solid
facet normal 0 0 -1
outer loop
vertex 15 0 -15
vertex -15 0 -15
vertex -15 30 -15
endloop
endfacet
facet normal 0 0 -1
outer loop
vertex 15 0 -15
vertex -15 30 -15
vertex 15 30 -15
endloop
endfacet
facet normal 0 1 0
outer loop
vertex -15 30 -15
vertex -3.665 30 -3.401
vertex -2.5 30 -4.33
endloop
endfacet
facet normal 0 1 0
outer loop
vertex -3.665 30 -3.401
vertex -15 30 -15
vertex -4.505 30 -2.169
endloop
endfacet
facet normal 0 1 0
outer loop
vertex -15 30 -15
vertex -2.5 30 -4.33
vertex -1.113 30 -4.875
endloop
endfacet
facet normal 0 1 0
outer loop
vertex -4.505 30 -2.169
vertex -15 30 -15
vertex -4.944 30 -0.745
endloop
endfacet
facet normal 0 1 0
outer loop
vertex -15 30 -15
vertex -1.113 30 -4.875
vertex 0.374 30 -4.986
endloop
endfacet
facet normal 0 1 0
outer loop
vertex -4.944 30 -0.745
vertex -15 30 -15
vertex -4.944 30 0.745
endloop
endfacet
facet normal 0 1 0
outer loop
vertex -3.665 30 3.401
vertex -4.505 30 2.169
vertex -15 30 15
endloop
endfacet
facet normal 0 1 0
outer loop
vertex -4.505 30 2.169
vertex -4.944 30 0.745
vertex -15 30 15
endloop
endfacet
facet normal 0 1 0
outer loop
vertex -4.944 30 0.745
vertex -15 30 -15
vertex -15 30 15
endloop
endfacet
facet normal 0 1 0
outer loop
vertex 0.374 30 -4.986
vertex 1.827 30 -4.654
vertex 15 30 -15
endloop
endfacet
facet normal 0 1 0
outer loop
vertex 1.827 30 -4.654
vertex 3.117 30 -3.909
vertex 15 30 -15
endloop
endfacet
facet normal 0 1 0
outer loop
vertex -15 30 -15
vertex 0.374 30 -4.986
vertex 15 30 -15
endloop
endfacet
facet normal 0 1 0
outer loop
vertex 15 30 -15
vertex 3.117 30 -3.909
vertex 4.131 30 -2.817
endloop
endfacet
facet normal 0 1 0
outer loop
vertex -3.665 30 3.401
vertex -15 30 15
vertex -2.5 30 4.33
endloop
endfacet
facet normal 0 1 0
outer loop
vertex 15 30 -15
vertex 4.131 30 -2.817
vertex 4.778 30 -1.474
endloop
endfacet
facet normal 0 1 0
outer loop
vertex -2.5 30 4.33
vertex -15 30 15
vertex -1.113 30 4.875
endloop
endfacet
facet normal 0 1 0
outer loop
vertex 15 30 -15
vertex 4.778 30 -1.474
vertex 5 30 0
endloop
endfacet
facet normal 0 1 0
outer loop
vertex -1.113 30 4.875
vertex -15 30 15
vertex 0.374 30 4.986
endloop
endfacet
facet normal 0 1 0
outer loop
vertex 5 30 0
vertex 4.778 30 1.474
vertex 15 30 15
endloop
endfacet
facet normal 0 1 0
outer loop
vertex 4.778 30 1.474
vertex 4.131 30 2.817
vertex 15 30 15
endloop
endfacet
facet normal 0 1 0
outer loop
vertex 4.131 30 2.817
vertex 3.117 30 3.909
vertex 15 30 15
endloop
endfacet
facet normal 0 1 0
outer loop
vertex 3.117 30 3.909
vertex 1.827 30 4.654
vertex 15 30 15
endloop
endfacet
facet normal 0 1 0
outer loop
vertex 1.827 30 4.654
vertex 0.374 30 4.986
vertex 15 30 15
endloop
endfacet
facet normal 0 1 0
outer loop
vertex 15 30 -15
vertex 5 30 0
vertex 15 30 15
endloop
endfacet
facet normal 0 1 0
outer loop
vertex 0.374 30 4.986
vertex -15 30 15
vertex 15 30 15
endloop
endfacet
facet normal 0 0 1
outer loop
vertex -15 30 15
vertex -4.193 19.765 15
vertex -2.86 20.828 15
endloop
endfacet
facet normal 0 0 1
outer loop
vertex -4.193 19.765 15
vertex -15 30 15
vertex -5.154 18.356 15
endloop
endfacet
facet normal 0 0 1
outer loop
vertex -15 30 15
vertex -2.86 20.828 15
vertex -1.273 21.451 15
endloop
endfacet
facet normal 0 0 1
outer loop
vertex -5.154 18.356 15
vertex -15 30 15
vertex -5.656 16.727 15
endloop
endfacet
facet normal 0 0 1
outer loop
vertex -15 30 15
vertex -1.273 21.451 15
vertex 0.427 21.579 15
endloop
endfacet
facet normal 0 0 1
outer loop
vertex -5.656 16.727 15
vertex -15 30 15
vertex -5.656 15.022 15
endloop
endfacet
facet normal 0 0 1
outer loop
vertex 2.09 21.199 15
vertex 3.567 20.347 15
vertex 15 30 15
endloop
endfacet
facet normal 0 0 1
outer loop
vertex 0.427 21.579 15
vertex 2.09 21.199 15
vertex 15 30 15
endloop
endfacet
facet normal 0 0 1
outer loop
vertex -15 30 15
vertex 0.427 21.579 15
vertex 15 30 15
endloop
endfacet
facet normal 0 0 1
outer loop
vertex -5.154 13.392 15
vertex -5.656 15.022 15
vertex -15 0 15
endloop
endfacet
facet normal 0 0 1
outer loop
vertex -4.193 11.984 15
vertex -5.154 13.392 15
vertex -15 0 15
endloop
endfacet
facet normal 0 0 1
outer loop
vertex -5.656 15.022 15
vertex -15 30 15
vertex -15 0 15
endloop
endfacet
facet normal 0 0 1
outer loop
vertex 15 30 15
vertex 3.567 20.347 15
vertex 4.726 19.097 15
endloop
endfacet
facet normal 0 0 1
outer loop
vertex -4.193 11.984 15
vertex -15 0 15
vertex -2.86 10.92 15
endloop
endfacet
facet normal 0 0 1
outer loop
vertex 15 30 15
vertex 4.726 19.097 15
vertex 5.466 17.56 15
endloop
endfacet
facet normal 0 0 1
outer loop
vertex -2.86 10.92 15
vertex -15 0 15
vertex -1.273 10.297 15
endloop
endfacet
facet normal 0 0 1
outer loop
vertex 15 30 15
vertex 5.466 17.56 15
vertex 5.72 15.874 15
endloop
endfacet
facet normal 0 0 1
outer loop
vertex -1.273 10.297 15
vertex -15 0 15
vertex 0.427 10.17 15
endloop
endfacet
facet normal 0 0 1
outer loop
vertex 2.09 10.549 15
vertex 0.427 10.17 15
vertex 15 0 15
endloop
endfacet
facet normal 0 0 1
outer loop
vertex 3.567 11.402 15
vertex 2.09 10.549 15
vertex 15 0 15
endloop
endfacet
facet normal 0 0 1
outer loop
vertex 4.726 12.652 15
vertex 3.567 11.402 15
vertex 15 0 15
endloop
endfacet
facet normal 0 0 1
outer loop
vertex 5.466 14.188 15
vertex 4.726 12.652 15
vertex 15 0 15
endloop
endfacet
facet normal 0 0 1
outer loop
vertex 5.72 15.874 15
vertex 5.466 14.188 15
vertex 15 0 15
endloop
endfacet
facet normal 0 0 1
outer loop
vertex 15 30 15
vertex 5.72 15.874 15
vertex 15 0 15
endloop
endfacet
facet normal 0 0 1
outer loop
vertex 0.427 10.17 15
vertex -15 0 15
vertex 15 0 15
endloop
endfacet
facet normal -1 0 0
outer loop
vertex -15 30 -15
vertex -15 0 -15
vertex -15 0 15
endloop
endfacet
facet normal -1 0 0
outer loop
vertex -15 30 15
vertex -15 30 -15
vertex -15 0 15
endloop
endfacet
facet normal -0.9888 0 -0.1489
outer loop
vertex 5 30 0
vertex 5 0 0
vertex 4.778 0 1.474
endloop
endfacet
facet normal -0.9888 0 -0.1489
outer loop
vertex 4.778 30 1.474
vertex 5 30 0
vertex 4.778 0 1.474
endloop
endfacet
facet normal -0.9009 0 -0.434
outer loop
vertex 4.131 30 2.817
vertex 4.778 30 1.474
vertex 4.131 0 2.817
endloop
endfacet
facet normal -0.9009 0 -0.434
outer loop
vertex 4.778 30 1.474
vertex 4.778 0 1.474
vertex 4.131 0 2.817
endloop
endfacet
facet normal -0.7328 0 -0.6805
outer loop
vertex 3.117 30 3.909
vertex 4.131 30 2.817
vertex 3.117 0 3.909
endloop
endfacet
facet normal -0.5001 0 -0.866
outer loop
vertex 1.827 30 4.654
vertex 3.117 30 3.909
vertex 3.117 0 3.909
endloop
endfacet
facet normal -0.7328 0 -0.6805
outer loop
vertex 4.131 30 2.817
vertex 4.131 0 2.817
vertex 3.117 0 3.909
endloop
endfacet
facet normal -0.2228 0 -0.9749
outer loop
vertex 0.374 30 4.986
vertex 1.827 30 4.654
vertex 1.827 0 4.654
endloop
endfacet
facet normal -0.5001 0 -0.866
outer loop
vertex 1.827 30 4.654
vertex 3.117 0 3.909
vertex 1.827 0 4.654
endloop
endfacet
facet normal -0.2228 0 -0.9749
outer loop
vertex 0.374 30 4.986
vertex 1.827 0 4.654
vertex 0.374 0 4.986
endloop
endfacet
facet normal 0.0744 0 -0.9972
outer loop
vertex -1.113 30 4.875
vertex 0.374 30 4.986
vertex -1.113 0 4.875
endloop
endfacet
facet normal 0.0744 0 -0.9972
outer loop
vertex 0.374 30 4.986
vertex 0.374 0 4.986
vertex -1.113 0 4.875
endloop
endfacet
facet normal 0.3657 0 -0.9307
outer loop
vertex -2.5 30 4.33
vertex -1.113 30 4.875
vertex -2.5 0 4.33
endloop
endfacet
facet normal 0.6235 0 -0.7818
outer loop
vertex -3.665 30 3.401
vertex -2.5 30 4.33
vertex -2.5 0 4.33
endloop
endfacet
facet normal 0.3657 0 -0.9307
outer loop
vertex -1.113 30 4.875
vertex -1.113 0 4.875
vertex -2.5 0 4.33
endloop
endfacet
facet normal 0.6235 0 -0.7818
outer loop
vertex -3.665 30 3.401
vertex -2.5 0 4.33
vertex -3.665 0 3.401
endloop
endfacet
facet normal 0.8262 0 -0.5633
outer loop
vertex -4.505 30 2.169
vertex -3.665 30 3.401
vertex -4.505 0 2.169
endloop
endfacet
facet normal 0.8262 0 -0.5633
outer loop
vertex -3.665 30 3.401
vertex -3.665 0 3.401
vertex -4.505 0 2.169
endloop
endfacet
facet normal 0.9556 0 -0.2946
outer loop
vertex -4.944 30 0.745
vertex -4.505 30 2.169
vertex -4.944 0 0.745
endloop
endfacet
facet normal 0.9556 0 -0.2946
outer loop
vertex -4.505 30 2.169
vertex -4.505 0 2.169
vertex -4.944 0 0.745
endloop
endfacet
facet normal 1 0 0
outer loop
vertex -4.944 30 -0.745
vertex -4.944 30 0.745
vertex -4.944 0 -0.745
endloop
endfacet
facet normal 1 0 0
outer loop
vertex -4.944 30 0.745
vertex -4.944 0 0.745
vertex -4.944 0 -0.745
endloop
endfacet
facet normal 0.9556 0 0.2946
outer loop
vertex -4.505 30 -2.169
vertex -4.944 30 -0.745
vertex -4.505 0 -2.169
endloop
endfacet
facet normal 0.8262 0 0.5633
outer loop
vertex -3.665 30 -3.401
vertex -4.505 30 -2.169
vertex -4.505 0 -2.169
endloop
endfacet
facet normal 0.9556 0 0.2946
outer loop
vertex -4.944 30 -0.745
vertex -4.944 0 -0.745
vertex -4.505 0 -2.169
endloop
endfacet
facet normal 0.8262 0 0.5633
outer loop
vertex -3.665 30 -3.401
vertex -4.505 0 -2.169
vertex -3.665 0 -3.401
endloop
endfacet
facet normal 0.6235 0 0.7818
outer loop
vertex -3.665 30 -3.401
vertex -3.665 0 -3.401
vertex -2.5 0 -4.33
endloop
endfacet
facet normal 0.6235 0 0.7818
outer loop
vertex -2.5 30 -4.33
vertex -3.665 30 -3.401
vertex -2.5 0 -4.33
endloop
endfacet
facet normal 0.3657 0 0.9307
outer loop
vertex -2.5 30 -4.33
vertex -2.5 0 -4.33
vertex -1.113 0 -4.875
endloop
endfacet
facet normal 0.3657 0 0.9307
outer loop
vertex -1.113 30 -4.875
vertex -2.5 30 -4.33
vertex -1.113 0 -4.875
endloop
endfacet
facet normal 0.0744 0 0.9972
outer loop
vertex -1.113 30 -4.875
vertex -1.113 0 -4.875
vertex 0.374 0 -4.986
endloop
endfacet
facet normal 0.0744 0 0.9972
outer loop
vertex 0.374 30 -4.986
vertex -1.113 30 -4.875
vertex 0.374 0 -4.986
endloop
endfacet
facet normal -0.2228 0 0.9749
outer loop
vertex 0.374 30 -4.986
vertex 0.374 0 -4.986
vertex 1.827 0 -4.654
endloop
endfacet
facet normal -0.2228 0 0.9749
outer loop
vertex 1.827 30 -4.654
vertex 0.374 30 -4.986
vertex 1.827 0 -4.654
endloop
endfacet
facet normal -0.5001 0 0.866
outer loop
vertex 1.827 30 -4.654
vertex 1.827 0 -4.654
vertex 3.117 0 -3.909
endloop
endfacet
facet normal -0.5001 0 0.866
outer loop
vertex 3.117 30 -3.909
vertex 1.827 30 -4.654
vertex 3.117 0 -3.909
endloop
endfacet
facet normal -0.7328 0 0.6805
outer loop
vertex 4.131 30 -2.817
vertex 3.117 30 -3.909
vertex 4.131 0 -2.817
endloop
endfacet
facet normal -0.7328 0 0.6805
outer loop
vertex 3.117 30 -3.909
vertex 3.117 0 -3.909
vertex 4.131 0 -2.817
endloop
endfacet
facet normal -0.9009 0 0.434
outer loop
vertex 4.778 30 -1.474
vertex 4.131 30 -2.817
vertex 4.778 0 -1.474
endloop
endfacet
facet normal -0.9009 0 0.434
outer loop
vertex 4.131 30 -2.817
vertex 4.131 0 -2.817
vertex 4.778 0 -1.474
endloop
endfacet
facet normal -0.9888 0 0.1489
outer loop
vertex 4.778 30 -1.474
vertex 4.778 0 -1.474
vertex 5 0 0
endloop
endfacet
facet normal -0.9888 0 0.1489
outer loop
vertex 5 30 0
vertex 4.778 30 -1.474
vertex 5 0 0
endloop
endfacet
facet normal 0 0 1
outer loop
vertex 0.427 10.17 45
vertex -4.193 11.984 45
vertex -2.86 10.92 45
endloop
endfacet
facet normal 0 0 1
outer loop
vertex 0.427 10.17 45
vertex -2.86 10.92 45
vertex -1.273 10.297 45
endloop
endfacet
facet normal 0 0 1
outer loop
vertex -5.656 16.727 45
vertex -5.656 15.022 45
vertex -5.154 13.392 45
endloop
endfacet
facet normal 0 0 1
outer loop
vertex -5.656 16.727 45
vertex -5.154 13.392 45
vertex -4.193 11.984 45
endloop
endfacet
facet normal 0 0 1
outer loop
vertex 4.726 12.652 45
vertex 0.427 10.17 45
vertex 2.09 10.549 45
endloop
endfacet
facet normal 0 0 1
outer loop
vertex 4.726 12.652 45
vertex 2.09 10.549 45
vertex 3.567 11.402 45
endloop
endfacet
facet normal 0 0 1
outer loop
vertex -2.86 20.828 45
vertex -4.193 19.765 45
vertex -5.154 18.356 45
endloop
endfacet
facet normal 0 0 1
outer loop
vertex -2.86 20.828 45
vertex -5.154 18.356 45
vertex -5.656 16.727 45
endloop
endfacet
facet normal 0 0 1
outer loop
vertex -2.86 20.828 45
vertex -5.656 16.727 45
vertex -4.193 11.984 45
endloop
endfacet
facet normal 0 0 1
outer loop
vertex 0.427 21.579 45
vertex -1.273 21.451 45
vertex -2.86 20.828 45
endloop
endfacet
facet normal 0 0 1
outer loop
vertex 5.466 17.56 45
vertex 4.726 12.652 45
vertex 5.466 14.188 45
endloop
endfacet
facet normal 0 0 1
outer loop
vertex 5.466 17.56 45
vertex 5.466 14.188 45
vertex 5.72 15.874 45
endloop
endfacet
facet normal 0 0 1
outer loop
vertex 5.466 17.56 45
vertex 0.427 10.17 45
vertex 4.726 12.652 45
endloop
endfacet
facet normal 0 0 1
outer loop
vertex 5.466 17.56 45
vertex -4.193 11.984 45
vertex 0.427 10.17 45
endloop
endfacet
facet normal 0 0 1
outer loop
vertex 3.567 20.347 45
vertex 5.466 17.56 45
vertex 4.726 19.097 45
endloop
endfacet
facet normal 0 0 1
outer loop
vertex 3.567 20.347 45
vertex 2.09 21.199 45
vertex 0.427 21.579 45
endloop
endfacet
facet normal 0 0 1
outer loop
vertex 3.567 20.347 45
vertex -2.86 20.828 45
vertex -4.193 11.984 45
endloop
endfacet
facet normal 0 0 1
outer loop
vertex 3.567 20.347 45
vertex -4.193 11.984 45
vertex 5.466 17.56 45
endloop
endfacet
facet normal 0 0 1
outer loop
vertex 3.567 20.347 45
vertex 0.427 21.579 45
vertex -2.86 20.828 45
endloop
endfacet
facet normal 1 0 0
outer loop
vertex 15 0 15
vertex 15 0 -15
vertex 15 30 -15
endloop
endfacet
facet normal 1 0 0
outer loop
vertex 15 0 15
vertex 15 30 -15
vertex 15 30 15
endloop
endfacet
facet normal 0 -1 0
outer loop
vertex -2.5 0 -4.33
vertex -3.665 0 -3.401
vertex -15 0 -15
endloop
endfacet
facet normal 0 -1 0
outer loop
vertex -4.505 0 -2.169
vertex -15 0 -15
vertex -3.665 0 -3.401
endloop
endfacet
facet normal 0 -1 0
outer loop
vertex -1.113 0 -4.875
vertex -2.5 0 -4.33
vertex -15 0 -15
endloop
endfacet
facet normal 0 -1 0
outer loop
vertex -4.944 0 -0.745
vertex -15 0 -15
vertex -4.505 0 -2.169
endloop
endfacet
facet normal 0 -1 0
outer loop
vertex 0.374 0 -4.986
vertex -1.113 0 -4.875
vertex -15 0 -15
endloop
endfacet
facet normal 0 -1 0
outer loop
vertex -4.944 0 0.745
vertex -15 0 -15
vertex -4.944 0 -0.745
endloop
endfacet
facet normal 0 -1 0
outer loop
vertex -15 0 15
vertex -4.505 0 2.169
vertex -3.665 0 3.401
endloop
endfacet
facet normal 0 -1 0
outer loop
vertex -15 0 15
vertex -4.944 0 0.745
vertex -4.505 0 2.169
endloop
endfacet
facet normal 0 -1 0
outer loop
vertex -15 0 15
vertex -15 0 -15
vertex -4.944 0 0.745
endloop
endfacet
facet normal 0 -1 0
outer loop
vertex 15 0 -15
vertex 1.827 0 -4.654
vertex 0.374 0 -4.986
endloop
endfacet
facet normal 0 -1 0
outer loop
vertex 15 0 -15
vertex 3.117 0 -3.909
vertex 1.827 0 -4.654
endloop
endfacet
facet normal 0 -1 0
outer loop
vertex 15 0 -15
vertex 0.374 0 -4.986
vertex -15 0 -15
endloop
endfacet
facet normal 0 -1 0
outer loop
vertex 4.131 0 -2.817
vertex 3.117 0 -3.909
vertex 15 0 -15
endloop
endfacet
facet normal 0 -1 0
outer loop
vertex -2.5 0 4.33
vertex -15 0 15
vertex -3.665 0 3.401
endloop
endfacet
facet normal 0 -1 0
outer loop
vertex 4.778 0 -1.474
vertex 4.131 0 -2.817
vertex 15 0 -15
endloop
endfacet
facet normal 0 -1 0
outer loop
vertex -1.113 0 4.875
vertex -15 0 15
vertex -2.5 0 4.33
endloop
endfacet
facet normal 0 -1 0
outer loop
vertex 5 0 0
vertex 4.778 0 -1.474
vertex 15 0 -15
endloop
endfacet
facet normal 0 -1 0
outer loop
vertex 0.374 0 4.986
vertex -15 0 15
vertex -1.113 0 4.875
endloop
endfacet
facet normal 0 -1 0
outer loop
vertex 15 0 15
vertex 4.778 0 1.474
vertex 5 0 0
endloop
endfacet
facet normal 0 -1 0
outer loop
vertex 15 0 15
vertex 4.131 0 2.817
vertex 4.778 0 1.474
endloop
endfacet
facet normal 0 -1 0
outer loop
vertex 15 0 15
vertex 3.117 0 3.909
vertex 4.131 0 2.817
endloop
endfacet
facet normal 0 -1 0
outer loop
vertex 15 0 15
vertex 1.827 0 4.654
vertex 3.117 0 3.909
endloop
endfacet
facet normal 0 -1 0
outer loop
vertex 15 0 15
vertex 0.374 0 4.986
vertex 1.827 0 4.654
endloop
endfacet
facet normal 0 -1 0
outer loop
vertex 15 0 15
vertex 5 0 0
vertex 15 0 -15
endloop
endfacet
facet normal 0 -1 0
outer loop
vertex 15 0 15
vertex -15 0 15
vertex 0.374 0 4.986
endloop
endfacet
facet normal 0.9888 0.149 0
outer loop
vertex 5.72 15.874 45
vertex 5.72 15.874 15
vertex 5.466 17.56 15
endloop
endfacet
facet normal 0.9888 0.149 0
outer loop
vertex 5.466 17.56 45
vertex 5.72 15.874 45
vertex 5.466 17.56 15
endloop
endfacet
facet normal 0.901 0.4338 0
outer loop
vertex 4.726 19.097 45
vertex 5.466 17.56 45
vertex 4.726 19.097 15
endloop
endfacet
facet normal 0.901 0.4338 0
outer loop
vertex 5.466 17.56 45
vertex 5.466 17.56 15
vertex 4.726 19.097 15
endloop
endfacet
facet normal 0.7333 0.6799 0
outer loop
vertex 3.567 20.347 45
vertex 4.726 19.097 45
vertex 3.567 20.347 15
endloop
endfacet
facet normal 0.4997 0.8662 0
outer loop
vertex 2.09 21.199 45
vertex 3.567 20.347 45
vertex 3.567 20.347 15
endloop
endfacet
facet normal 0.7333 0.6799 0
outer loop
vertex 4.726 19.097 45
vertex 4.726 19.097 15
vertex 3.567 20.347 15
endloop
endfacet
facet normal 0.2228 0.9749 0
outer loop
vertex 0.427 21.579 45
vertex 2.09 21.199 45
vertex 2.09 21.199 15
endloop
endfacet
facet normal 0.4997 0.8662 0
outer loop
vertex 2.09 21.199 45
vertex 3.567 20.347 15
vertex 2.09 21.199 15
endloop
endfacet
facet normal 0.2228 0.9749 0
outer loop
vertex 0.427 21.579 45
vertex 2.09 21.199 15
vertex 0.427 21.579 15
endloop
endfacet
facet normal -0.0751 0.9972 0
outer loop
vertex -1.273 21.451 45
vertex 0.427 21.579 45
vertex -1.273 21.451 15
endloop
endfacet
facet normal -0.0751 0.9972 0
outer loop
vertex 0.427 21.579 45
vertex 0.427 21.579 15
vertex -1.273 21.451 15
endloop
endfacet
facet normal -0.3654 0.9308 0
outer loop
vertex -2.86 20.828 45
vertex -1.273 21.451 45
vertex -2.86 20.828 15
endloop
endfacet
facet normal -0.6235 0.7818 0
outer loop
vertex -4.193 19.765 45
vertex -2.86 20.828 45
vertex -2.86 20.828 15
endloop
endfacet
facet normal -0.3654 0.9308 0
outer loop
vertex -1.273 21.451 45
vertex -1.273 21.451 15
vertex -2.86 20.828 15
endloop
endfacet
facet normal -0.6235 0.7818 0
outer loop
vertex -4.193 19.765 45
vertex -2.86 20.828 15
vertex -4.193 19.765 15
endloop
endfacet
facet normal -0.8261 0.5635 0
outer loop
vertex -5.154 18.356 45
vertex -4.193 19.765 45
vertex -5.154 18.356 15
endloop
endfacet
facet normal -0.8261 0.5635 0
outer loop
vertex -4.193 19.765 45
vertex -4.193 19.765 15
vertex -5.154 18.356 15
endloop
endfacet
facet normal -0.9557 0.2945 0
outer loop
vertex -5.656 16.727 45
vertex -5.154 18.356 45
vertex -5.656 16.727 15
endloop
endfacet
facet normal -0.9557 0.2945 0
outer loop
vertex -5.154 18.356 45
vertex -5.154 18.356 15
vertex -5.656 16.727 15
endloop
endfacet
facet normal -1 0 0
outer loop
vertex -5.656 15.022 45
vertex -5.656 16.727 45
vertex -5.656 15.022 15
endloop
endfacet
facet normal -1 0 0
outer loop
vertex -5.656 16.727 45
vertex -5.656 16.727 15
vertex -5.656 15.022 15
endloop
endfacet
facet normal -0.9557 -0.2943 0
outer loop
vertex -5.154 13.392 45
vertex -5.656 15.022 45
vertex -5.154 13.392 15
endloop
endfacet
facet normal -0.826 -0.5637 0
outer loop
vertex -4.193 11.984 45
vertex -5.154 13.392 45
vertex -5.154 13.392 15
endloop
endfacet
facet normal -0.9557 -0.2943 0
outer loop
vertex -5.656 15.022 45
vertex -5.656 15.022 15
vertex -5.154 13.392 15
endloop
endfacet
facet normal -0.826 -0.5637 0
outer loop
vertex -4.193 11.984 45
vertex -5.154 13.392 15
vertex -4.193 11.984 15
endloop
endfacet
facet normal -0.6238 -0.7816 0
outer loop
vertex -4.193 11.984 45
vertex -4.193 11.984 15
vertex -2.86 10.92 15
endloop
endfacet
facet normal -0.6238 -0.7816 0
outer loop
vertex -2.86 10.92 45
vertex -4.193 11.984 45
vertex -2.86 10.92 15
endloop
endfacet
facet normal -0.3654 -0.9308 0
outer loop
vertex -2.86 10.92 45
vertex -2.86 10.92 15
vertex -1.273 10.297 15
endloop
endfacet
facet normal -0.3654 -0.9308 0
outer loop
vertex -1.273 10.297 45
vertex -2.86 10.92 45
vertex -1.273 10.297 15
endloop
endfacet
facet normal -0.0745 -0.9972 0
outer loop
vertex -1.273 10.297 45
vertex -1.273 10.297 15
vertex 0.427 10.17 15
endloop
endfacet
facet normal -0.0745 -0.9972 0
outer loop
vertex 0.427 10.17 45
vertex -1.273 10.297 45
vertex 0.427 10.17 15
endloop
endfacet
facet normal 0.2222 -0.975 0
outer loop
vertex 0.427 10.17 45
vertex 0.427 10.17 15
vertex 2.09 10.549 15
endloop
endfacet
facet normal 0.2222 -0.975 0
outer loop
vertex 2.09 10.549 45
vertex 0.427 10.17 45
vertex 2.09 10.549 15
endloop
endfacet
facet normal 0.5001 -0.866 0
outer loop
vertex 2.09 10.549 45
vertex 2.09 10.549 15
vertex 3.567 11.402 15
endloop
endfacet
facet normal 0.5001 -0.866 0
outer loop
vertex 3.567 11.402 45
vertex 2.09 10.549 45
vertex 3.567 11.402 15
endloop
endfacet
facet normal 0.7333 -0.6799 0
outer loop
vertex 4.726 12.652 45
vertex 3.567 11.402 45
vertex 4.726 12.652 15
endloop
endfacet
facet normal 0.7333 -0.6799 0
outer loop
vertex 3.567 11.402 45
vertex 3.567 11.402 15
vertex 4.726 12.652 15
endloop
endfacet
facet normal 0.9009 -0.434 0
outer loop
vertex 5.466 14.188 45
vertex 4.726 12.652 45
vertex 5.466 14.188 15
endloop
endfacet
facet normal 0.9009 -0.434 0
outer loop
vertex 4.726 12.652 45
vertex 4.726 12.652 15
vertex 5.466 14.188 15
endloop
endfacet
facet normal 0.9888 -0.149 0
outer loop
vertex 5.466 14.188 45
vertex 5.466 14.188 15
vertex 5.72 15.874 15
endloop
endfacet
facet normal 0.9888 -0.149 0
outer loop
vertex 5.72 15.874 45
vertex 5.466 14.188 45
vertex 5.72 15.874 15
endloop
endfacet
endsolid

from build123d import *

# Parameters (mm, degrees)
F0_W     = 30
F0_H     = 30
F1_DEPTH = 30
F2_R     = 5
F3_DEPTH = 30
F4_R     = 5.7203
F5_DEPTH = 30


with BuildPart() as f1:
    # F0 (on Front) → F1 (new body)
    with BuildSketch(Plane.XZ):
        Rectangle(F0_W, F0_H)
    extrude(amount=-F1_DEPTH)

    # F2 (on face) → F3 (cut)
    with BuildSketch(Plane.XZ):
        Circle(F2_R)
    extrude(amount=-F3_DEPTH, mode=Mode.SUBTRACT)

    # F4 (on face) → F5 (join)
    with BuildSketch(Plane.XY.offset(15)):
        with Locations((0, 15.874371)):
            Circle(F4_R)
    extrude(amount=F5_DEPTH)


solid = f1.part
